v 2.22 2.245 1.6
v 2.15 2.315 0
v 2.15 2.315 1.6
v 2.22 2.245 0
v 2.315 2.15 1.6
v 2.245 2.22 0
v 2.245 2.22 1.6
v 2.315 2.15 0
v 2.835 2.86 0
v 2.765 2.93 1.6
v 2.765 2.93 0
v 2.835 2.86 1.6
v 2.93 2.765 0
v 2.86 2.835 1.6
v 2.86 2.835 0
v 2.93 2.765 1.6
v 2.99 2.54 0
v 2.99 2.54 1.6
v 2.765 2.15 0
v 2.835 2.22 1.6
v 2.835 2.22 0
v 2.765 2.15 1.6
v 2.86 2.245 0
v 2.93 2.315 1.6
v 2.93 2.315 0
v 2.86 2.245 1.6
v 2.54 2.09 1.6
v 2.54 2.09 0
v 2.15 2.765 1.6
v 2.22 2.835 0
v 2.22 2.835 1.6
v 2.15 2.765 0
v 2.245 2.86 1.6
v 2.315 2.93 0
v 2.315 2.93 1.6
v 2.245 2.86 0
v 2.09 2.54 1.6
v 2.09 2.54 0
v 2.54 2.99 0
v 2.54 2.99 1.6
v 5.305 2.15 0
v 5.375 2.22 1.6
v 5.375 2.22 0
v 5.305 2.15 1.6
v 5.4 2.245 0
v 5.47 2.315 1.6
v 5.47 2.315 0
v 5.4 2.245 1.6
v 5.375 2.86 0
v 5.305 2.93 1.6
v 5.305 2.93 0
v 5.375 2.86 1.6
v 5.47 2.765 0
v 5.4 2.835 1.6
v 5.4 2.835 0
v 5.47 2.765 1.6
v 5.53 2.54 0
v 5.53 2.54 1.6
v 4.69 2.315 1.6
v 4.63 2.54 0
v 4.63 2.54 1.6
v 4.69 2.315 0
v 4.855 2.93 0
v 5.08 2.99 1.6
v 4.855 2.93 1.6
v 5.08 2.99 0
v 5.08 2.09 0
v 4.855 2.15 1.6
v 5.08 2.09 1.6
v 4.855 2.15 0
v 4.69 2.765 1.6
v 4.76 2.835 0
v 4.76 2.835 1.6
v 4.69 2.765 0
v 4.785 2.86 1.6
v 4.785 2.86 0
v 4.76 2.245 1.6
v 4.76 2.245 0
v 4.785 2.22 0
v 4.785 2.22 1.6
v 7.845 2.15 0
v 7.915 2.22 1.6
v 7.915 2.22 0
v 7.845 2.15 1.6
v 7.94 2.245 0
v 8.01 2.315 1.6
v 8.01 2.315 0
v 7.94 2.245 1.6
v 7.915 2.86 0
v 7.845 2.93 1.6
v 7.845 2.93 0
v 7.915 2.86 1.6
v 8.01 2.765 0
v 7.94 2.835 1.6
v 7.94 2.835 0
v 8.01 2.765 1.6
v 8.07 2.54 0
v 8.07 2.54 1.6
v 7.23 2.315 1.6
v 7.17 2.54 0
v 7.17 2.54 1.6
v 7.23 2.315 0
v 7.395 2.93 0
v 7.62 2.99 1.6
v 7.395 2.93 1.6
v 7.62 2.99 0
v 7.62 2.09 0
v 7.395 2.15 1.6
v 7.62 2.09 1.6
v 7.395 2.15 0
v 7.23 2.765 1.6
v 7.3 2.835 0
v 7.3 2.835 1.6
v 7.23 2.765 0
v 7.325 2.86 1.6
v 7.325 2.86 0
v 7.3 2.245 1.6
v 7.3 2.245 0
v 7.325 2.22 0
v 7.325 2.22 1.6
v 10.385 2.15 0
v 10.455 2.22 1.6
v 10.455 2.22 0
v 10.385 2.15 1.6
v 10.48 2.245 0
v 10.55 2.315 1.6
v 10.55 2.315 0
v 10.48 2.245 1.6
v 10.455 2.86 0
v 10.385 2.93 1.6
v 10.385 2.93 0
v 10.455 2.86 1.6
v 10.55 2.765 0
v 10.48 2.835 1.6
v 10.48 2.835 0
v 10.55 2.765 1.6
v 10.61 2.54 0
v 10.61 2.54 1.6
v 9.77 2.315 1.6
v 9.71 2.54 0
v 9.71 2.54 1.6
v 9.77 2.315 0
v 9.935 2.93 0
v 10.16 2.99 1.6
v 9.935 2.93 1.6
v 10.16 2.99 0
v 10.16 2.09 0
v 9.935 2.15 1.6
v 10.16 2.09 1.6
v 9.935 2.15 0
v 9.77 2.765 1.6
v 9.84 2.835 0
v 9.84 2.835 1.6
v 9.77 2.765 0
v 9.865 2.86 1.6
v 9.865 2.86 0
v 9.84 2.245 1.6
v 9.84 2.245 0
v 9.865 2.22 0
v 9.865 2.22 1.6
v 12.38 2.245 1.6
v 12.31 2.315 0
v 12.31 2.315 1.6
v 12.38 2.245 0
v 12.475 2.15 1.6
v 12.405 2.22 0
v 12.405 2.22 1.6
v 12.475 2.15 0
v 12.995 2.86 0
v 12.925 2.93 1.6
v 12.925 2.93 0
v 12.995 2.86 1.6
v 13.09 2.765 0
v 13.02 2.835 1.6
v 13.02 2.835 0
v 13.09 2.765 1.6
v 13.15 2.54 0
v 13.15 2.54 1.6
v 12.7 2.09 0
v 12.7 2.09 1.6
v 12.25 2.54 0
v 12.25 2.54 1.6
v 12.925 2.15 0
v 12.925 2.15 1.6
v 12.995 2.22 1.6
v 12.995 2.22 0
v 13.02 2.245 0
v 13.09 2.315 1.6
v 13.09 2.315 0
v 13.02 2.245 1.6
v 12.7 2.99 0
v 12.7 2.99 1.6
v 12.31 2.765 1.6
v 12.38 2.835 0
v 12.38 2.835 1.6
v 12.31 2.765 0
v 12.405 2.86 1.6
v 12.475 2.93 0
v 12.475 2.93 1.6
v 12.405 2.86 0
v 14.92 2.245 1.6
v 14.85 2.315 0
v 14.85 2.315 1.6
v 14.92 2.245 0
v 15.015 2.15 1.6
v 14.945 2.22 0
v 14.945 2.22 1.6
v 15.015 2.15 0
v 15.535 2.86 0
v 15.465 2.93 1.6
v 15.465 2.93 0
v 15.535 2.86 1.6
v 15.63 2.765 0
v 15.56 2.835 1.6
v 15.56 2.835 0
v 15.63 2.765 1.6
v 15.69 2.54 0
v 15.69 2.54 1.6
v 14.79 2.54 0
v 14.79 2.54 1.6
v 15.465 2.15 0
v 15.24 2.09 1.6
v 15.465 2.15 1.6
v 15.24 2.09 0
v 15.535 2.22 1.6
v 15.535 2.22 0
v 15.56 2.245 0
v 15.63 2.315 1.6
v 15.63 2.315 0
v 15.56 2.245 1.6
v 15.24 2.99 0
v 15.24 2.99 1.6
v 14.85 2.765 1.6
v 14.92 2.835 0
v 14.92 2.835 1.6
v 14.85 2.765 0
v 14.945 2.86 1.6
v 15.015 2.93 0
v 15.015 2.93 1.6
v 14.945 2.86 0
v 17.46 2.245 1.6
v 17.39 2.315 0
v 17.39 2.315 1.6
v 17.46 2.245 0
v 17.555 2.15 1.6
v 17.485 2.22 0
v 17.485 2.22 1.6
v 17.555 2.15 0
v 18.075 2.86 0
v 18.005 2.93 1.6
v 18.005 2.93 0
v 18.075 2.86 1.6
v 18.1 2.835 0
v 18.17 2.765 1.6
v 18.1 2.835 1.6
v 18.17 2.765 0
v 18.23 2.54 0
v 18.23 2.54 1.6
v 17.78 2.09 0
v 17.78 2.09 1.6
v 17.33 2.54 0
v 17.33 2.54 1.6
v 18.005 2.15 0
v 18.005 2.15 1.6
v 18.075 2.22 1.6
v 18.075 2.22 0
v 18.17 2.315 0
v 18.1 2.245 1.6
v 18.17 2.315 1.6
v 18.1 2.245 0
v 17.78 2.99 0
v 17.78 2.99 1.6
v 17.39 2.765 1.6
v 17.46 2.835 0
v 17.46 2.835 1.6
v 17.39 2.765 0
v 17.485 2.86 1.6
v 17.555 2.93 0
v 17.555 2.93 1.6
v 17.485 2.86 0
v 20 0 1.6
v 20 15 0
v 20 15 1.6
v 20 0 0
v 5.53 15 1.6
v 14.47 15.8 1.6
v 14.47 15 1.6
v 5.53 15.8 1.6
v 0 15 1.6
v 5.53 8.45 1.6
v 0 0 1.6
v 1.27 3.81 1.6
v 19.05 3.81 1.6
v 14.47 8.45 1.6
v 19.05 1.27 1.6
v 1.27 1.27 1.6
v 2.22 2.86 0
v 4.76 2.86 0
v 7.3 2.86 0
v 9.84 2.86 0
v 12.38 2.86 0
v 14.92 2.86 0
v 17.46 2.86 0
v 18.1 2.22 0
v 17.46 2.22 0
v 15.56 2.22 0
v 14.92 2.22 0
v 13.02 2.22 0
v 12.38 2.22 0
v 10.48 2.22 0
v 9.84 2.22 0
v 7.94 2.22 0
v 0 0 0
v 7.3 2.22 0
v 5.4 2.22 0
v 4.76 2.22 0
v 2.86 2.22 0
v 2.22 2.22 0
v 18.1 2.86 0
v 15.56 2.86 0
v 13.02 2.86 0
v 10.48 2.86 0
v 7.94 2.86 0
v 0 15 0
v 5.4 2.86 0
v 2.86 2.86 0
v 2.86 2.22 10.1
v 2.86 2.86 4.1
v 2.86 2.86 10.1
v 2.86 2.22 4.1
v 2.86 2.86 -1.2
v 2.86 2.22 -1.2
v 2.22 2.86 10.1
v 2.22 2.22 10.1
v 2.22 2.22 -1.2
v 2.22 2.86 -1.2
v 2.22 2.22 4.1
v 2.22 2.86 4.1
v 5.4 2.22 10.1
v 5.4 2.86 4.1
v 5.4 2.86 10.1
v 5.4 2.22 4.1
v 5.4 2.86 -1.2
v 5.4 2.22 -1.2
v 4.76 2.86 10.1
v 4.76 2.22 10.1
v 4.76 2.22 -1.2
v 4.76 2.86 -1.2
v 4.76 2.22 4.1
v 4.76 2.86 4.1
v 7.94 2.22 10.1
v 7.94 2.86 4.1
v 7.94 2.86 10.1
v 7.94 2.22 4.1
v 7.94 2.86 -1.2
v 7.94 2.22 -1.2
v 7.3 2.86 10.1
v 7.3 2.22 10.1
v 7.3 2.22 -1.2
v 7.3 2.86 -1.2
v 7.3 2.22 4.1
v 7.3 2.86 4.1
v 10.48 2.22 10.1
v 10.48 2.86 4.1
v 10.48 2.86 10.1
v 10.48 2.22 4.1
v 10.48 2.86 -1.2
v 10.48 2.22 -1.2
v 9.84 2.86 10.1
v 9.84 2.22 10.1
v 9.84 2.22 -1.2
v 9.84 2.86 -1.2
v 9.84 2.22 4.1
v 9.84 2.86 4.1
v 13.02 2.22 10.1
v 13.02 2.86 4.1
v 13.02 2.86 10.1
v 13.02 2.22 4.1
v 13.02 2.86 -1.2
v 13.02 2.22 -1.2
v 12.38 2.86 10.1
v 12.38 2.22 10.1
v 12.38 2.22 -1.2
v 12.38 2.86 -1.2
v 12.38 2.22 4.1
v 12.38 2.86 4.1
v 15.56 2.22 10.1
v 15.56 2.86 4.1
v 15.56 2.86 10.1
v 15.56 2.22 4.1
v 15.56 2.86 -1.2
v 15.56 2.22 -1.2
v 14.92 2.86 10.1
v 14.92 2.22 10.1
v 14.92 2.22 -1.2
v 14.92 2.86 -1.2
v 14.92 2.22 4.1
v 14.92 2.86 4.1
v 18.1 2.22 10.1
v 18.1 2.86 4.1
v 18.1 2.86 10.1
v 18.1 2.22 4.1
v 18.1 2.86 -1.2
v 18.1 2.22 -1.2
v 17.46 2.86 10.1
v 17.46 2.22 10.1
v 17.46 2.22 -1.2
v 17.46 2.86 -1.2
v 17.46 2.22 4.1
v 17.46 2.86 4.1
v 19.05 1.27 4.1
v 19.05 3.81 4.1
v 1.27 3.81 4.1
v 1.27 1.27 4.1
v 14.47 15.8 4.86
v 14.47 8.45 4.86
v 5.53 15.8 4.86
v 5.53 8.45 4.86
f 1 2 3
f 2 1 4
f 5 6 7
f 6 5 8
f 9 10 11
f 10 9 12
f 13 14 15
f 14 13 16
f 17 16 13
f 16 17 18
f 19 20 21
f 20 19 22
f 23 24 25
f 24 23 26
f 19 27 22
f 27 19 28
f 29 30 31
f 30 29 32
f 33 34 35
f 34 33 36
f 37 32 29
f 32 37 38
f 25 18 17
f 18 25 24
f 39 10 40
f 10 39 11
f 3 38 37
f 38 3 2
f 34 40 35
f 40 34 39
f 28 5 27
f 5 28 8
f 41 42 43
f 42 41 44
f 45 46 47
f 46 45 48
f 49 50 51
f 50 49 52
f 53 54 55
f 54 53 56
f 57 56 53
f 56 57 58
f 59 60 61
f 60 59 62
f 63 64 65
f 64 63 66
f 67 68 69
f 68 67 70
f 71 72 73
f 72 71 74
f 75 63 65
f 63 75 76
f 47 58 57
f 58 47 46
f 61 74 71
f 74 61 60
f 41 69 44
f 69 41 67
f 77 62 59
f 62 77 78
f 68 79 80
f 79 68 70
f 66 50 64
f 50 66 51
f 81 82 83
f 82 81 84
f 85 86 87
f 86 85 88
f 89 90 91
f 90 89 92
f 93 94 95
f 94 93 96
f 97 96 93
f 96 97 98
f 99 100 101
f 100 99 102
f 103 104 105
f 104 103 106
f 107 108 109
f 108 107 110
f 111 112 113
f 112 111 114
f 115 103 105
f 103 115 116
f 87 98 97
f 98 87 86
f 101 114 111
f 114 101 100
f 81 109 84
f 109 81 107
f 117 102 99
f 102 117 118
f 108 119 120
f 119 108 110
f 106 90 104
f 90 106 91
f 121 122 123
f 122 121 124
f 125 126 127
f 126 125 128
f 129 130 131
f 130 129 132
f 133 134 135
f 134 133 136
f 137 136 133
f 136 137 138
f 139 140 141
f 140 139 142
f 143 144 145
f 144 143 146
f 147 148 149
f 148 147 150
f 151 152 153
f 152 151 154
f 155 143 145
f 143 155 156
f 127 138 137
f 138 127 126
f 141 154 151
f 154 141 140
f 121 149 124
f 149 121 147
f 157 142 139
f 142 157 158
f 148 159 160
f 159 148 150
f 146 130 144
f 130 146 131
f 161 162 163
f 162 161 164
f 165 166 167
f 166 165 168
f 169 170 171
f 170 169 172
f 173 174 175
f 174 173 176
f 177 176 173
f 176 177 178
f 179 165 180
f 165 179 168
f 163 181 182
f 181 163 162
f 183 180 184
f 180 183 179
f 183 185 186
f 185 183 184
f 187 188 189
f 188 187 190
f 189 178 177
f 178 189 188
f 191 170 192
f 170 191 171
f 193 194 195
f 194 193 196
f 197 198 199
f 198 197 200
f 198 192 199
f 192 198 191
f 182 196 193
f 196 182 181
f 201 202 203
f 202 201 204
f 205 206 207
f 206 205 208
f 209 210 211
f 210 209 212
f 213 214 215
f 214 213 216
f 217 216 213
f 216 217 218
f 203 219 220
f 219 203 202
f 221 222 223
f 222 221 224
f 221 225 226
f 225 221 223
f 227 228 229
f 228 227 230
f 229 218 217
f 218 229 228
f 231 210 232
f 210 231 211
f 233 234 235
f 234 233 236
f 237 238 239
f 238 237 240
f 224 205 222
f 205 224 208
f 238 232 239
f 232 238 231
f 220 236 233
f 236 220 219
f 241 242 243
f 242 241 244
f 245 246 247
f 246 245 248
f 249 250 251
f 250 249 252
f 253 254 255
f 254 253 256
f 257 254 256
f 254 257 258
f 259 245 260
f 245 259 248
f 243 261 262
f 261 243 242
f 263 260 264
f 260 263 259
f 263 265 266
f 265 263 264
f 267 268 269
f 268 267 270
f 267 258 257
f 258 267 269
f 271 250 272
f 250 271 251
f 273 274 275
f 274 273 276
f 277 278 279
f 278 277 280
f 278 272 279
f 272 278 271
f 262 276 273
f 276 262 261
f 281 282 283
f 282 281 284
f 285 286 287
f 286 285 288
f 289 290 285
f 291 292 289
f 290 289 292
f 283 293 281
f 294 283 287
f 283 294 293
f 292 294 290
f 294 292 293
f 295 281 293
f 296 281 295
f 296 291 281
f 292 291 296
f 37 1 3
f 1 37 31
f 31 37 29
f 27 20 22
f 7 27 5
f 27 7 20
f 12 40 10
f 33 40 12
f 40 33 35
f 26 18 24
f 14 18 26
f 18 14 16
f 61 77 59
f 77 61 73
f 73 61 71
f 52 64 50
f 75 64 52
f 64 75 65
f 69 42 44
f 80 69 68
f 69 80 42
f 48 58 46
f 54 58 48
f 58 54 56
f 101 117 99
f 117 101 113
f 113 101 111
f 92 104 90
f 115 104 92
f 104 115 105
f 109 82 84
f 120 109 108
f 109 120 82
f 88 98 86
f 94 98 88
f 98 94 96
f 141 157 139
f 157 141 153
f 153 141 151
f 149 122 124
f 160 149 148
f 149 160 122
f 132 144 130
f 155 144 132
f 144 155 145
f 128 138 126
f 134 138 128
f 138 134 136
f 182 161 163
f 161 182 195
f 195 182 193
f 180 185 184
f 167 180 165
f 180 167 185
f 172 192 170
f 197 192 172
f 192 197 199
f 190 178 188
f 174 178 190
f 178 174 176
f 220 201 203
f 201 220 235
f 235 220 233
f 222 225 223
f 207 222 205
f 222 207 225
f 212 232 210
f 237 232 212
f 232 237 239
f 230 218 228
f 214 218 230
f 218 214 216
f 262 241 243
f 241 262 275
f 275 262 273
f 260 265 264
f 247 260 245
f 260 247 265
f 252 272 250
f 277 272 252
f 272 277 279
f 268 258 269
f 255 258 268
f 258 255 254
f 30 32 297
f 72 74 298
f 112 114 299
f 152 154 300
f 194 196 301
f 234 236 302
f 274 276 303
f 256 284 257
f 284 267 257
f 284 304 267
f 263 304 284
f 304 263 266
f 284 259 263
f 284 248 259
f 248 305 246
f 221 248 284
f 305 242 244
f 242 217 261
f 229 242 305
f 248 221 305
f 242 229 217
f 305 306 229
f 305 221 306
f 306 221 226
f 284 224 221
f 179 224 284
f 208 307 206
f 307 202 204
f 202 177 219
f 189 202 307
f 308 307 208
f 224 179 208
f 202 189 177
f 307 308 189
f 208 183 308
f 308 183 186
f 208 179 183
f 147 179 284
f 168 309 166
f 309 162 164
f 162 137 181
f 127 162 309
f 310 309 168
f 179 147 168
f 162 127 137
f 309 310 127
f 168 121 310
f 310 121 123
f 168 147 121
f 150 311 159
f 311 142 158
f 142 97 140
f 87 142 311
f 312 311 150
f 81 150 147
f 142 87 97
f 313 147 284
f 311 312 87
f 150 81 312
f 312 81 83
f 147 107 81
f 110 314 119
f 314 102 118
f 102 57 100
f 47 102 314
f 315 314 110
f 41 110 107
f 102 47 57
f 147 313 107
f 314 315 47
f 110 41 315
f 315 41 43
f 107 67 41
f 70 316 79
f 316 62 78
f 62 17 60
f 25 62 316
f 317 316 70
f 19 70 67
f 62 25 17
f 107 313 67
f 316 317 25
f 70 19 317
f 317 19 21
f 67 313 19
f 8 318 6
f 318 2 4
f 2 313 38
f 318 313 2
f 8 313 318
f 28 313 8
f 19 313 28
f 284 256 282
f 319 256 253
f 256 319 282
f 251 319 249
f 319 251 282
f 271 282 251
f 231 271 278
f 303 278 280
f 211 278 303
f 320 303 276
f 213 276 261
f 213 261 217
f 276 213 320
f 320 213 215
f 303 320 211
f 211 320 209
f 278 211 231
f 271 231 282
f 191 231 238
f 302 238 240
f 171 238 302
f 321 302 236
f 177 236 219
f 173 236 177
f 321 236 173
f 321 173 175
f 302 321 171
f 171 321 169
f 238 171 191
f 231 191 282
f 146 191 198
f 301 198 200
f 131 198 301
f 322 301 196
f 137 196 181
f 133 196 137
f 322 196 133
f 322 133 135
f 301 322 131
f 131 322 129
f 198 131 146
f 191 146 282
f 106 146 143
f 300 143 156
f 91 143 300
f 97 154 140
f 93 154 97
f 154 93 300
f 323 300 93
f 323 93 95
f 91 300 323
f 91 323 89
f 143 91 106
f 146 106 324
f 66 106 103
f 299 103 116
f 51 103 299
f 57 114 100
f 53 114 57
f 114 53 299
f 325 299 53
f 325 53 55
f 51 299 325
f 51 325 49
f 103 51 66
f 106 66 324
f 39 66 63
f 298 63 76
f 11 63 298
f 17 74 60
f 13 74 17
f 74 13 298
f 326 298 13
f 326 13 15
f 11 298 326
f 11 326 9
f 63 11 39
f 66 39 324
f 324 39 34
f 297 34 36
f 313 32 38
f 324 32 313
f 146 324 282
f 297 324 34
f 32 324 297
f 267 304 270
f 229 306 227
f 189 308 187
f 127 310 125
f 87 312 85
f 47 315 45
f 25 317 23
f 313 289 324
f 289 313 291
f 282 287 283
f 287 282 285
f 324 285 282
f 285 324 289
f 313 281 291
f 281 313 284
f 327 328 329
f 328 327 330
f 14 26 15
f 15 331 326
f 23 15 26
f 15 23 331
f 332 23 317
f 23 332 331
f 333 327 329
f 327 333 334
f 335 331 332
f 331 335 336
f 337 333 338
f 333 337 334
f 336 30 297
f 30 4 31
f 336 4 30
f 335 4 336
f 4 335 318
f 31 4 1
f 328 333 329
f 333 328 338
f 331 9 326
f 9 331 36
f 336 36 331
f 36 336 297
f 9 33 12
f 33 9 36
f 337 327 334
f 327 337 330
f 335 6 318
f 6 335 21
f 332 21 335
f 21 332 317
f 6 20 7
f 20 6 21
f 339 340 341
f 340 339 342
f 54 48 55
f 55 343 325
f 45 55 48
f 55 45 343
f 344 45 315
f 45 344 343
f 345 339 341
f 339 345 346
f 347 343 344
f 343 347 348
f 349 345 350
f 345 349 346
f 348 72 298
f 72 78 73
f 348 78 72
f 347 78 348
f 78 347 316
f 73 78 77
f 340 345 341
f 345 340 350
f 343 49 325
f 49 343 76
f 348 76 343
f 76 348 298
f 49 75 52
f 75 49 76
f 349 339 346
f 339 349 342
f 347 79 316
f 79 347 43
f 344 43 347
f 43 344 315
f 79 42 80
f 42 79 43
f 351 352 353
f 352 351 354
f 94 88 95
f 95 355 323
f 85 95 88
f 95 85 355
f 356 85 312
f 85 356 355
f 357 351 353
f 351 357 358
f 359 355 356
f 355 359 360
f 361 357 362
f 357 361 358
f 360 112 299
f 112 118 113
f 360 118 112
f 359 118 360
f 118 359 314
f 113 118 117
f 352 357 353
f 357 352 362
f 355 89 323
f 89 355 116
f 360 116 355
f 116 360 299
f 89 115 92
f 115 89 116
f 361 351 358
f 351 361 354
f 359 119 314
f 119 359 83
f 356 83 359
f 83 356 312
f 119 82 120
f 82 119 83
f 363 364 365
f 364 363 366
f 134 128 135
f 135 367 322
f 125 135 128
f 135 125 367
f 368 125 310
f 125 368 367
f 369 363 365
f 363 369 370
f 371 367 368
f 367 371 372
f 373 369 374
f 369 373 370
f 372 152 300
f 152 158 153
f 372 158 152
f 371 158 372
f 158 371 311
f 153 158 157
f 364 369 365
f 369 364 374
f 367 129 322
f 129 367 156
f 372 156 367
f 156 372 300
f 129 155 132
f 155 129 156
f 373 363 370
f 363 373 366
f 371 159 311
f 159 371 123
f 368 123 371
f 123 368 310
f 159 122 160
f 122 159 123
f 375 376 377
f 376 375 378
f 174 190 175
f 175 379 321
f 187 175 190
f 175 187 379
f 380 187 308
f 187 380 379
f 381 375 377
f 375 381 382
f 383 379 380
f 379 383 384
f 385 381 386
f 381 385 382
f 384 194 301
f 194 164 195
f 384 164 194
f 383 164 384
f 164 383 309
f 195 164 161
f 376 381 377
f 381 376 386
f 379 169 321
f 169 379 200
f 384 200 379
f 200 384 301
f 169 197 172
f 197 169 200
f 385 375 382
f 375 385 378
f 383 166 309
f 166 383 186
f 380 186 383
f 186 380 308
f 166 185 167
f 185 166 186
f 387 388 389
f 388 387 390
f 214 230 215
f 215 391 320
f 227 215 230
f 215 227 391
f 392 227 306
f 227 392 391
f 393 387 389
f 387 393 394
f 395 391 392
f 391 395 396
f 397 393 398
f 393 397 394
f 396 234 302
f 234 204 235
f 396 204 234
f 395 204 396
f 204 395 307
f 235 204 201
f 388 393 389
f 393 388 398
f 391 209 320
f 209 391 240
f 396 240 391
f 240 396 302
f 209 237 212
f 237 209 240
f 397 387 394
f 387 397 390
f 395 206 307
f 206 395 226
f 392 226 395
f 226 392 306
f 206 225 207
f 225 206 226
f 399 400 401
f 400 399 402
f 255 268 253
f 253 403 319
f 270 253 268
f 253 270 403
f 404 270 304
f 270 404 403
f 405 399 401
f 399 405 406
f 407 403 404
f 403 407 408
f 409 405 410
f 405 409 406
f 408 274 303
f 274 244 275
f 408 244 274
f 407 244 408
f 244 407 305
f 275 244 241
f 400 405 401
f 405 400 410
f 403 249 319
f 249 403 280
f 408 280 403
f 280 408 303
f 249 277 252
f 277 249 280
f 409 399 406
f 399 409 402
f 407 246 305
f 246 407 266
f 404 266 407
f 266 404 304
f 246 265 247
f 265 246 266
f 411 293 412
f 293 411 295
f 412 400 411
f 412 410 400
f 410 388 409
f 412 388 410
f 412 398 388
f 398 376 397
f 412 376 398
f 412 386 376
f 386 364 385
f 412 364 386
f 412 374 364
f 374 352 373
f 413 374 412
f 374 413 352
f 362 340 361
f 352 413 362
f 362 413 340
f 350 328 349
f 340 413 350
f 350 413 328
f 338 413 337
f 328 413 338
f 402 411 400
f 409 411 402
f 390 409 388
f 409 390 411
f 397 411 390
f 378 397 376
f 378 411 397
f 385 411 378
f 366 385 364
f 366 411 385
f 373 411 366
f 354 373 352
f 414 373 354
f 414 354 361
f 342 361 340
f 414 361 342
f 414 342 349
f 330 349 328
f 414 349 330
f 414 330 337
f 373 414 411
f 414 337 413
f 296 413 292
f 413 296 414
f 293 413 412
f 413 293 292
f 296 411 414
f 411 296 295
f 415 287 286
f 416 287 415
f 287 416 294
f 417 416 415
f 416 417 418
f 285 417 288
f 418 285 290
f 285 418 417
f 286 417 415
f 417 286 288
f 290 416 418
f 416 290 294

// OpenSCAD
// ============================================================================
// 秋月 [115426] USB Type-C コネクター DIP 化キット（シンプル版エコノミータイプ）¥180
//   📄 基板寸法図 AE-USB2.0-TYPE-C-5077CR_rev1.pdf（2026-08-24 取得）: 基板 20 × 15、ランドは 2.54 グリッド
//      下辺に 7 ピン（VBUS / GND / +D / −D / CC1 / CC2 / GND・φ0.9）。コネクタ 5077CR の足（長穴 1.4×0.6・1.7×0.6）は上辺側
//   📄 コネクタ 5077CR-16-SMC2-BK-TR: 横型・胴 8.94 × 7.35・高さ 3.26（データシート）⚠ 口が基板の縁から出る量は図に無い → 0.8 と置く
//   🔴 CC1/CC2 に抵抗は**載っていない**。C-C ケーブルで充電するには CC1-GND / CC2-GND に 5.1kΩ を各 1 本、自分で付ける
//   ⚠ 2026-08-24 時点で**未注文**（ユーザー）
//
//   ローカル座標: 原点 = 基板の左下（部品面から見て）。+X 右、+Y 上（コネクタの口が向く側）、+Z 部品面
// ============================================================================
TC_BD = [20.0, 15.0, 1.6];
TC_CONN = [8.94, 7.35, 3.26];   // 胴 X × Y × 高さ
TC_CONN_OUT = 0.8;              // ⚠ 口が上辺から出る量
TC_PIN_Y = 2.54;                // 下辺のピン列の Y（図: 縁から 1 グリッド）
TC_PIN_X0 = 2.54;               // 1 番（VBUS・四角ランド）の X
TC_NAMES = ["VBUS", "GND", "+D", "-D", "CC1", "CC2", "GND"];

function tc_size()   = TC_BD;
function tc_conn()   = TC_CONN;
function tc_nose_y() = TC_BD[1] + TC_CONN_OUT;                 // 口の面の Y（15.8）
function tc_conn_zc() = TC_BD[2] + TC_CONN[2] / 2;            // 口の中心の Z（3.23）
function tc_pin(i)   = [TC_PIN_X0 + i * 2.54, TC_PIN_Y];

module typec_115426(pins = true, pin_len = 6.0) {
    color("#1a5c2a") difference() {
        cube(TC_BD);
        for (i = [0 : 6]) translate([tc_pin(i)[0], tc_pin(i)[1], -1]) cylinder(d = 0.9, h = TC_BD[2] + 2, $fn = 12);
    }
    // コネクタ（上辺・中央）。口は +Y
    color("#c8ccd0") translate([TC_BD[0] / 2 - TC_CONN[0] / 2, TC_BD[1] - TC_CONN[1] + TC_CONN_OUT, TC_BD[2]]) cube(TC_CONN);
    // 下辺のピン（真っ直ぐなヘッダを立てた場合・樹脂 2.5 ＋ ピン）
    if (pins) {
        color("#222") translate([TC_PIN_X0 - 1.27, TC_PIN_Y - 1.27, TC_BD[2]]) cube([7 * 2.54, 2.54, 2.5]);
        color("#c8ccd0") for (i = [0 : 6]) translate([tc_pin(i)[0] - 0.32, tc_pin(i)[1] - 0.32, -1.2]) cube([0.64, 0.64, 1.2 + TC_BD[2] + 2.5 + pin_len]);
    }
}
typec_115426();
